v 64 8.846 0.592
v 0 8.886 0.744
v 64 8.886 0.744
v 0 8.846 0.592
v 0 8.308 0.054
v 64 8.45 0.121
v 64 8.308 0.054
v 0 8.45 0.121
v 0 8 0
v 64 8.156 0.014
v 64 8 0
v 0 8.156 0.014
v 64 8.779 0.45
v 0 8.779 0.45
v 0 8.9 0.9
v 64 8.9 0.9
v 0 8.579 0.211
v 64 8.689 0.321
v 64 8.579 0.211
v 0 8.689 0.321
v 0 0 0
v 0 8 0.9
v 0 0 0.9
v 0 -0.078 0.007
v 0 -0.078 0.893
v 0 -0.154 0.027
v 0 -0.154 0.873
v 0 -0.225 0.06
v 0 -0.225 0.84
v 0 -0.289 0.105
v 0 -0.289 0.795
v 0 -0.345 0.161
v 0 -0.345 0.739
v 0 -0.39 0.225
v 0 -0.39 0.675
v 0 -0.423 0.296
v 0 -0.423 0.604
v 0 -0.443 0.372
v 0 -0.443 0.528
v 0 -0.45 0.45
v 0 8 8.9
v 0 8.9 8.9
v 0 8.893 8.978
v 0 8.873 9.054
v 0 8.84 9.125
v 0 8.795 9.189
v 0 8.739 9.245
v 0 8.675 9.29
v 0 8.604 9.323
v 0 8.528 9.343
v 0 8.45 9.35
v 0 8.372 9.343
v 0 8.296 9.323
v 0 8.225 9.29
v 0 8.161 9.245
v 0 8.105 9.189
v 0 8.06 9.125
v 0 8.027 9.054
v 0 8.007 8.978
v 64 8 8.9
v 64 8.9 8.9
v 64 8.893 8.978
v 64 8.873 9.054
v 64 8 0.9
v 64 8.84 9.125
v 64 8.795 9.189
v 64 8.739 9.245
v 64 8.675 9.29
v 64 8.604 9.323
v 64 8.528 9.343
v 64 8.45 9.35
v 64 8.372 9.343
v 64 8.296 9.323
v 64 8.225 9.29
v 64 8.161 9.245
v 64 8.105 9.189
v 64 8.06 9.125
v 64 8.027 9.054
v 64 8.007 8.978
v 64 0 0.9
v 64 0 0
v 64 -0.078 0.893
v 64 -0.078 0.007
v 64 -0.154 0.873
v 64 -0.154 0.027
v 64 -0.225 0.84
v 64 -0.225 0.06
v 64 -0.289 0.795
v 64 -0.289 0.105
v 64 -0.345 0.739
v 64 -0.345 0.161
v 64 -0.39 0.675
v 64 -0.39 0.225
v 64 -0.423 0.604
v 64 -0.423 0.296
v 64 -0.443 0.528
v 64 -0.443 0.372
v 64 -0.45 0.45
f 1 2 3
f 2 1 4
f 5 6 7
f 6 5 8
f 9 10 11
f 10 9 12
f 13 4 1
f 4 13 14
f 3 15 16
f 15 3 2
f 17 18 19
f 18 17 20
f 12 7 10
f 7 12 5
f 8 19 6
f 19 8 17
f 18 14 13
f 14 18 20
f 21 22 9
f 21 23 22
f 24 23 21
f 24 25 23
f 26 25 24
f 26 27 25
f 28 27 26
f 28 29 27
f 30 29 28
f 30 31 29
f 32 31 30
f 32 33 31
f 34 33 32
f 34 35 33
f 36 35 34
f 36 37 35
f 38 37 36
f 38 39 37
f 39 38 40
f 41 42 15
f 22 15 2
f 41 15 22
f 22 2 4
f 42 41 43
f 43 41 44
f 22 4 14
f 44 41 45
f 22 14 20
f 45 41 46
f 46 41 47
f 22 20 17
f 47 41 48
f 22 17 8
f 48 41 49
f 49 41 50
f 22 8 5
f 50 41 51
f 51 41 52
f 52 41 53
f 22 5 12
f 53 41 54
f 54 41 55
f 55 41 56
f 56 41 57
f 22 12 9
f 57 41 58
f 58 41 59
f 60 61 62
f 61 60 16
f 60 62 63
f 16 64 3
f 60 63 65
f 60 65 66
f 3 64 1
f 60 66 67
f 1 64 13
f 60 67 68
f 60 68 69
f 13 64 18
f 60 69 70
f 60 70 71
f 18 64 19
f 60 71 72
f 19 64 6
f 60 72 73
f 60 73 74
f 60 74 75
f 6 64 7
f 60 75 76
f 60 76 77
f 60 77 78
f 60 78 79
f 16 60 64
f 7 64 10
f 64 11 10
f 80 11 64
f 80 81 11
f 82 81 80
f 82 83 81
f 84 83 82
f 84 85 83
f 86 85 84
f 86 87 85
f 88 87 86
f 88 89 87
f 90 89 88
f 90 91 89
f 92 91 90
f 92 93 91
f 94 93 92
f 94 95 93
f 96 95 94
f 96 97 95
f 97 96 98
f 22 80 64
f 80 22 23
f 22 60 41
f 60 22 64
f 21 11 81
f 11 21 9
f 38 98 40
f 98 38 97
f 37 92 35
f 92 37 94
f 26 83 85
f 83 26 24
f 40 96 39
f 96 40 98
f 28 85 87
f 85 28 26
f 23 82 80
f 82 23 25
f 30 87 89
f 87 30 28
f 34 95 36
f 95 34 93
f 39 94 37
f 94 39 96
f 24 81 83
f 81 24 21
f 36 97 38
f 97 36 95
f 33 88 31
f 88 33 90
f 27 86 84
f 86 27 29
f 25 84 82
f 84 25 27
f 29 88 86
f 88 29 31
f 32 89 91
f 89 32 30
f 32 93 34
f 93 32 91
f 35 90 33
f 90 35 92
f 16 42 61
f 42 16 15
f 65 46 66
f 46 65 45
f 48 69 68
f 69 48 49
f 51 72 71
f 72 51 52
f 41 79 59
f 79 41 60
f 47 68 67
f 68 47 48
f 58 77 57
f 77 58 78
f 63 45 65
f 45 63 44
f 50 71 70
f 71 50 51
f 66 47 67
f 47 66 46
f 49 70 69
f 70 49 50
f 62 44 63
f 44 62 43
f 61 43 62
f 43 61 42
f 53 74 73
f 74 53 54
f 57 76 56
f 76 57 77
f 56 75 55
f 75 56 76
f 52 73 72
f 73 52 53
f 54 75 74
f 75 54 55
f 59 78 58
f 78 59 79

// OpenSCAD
t=0.9; //0.3 + 3*0.2 //also 0.3 + 0.6 = 0.9
w=64;
h=8;
$fn=36;

module bottom()
{
    cube([w,h,t]); //unten
}

module bottomEdge()
{
    translate([0,0,t/2])
    color("green")
    rotate([0,90,0])
    cylinder(h=w,r=t/2);
}

module connectorSquare()
{
    //verbinder
    //translate([0,h,0]) 
    //color("red")
    //cube([w,t,t]);
}

module connectorRounded()
{
    difference() 
    {
        //verbinder abgerundet als zylinder
        translate([0,h,t])
        rotate([0,90,0])
        color("blue")
        cylinder(h=w,r=t);

        translate([0,h-t,t]) 
        color("yellow")
        cube([w,t,t]);
    }
}

module back()
{
    translate([0,h,t]) //hinten
    cube([w,t,h]);
}

module backEdge()
{
    translate([0,h+t/2,h+t])
    color("green")
    rotate([0,90,0])
    cylinder(h=w,r=t/2);
}

module winkelleiste()
{
    bottom();
    bottomEdge();
    connectorRounded();
    back();
    backEdge();
}

winkelleiste();
